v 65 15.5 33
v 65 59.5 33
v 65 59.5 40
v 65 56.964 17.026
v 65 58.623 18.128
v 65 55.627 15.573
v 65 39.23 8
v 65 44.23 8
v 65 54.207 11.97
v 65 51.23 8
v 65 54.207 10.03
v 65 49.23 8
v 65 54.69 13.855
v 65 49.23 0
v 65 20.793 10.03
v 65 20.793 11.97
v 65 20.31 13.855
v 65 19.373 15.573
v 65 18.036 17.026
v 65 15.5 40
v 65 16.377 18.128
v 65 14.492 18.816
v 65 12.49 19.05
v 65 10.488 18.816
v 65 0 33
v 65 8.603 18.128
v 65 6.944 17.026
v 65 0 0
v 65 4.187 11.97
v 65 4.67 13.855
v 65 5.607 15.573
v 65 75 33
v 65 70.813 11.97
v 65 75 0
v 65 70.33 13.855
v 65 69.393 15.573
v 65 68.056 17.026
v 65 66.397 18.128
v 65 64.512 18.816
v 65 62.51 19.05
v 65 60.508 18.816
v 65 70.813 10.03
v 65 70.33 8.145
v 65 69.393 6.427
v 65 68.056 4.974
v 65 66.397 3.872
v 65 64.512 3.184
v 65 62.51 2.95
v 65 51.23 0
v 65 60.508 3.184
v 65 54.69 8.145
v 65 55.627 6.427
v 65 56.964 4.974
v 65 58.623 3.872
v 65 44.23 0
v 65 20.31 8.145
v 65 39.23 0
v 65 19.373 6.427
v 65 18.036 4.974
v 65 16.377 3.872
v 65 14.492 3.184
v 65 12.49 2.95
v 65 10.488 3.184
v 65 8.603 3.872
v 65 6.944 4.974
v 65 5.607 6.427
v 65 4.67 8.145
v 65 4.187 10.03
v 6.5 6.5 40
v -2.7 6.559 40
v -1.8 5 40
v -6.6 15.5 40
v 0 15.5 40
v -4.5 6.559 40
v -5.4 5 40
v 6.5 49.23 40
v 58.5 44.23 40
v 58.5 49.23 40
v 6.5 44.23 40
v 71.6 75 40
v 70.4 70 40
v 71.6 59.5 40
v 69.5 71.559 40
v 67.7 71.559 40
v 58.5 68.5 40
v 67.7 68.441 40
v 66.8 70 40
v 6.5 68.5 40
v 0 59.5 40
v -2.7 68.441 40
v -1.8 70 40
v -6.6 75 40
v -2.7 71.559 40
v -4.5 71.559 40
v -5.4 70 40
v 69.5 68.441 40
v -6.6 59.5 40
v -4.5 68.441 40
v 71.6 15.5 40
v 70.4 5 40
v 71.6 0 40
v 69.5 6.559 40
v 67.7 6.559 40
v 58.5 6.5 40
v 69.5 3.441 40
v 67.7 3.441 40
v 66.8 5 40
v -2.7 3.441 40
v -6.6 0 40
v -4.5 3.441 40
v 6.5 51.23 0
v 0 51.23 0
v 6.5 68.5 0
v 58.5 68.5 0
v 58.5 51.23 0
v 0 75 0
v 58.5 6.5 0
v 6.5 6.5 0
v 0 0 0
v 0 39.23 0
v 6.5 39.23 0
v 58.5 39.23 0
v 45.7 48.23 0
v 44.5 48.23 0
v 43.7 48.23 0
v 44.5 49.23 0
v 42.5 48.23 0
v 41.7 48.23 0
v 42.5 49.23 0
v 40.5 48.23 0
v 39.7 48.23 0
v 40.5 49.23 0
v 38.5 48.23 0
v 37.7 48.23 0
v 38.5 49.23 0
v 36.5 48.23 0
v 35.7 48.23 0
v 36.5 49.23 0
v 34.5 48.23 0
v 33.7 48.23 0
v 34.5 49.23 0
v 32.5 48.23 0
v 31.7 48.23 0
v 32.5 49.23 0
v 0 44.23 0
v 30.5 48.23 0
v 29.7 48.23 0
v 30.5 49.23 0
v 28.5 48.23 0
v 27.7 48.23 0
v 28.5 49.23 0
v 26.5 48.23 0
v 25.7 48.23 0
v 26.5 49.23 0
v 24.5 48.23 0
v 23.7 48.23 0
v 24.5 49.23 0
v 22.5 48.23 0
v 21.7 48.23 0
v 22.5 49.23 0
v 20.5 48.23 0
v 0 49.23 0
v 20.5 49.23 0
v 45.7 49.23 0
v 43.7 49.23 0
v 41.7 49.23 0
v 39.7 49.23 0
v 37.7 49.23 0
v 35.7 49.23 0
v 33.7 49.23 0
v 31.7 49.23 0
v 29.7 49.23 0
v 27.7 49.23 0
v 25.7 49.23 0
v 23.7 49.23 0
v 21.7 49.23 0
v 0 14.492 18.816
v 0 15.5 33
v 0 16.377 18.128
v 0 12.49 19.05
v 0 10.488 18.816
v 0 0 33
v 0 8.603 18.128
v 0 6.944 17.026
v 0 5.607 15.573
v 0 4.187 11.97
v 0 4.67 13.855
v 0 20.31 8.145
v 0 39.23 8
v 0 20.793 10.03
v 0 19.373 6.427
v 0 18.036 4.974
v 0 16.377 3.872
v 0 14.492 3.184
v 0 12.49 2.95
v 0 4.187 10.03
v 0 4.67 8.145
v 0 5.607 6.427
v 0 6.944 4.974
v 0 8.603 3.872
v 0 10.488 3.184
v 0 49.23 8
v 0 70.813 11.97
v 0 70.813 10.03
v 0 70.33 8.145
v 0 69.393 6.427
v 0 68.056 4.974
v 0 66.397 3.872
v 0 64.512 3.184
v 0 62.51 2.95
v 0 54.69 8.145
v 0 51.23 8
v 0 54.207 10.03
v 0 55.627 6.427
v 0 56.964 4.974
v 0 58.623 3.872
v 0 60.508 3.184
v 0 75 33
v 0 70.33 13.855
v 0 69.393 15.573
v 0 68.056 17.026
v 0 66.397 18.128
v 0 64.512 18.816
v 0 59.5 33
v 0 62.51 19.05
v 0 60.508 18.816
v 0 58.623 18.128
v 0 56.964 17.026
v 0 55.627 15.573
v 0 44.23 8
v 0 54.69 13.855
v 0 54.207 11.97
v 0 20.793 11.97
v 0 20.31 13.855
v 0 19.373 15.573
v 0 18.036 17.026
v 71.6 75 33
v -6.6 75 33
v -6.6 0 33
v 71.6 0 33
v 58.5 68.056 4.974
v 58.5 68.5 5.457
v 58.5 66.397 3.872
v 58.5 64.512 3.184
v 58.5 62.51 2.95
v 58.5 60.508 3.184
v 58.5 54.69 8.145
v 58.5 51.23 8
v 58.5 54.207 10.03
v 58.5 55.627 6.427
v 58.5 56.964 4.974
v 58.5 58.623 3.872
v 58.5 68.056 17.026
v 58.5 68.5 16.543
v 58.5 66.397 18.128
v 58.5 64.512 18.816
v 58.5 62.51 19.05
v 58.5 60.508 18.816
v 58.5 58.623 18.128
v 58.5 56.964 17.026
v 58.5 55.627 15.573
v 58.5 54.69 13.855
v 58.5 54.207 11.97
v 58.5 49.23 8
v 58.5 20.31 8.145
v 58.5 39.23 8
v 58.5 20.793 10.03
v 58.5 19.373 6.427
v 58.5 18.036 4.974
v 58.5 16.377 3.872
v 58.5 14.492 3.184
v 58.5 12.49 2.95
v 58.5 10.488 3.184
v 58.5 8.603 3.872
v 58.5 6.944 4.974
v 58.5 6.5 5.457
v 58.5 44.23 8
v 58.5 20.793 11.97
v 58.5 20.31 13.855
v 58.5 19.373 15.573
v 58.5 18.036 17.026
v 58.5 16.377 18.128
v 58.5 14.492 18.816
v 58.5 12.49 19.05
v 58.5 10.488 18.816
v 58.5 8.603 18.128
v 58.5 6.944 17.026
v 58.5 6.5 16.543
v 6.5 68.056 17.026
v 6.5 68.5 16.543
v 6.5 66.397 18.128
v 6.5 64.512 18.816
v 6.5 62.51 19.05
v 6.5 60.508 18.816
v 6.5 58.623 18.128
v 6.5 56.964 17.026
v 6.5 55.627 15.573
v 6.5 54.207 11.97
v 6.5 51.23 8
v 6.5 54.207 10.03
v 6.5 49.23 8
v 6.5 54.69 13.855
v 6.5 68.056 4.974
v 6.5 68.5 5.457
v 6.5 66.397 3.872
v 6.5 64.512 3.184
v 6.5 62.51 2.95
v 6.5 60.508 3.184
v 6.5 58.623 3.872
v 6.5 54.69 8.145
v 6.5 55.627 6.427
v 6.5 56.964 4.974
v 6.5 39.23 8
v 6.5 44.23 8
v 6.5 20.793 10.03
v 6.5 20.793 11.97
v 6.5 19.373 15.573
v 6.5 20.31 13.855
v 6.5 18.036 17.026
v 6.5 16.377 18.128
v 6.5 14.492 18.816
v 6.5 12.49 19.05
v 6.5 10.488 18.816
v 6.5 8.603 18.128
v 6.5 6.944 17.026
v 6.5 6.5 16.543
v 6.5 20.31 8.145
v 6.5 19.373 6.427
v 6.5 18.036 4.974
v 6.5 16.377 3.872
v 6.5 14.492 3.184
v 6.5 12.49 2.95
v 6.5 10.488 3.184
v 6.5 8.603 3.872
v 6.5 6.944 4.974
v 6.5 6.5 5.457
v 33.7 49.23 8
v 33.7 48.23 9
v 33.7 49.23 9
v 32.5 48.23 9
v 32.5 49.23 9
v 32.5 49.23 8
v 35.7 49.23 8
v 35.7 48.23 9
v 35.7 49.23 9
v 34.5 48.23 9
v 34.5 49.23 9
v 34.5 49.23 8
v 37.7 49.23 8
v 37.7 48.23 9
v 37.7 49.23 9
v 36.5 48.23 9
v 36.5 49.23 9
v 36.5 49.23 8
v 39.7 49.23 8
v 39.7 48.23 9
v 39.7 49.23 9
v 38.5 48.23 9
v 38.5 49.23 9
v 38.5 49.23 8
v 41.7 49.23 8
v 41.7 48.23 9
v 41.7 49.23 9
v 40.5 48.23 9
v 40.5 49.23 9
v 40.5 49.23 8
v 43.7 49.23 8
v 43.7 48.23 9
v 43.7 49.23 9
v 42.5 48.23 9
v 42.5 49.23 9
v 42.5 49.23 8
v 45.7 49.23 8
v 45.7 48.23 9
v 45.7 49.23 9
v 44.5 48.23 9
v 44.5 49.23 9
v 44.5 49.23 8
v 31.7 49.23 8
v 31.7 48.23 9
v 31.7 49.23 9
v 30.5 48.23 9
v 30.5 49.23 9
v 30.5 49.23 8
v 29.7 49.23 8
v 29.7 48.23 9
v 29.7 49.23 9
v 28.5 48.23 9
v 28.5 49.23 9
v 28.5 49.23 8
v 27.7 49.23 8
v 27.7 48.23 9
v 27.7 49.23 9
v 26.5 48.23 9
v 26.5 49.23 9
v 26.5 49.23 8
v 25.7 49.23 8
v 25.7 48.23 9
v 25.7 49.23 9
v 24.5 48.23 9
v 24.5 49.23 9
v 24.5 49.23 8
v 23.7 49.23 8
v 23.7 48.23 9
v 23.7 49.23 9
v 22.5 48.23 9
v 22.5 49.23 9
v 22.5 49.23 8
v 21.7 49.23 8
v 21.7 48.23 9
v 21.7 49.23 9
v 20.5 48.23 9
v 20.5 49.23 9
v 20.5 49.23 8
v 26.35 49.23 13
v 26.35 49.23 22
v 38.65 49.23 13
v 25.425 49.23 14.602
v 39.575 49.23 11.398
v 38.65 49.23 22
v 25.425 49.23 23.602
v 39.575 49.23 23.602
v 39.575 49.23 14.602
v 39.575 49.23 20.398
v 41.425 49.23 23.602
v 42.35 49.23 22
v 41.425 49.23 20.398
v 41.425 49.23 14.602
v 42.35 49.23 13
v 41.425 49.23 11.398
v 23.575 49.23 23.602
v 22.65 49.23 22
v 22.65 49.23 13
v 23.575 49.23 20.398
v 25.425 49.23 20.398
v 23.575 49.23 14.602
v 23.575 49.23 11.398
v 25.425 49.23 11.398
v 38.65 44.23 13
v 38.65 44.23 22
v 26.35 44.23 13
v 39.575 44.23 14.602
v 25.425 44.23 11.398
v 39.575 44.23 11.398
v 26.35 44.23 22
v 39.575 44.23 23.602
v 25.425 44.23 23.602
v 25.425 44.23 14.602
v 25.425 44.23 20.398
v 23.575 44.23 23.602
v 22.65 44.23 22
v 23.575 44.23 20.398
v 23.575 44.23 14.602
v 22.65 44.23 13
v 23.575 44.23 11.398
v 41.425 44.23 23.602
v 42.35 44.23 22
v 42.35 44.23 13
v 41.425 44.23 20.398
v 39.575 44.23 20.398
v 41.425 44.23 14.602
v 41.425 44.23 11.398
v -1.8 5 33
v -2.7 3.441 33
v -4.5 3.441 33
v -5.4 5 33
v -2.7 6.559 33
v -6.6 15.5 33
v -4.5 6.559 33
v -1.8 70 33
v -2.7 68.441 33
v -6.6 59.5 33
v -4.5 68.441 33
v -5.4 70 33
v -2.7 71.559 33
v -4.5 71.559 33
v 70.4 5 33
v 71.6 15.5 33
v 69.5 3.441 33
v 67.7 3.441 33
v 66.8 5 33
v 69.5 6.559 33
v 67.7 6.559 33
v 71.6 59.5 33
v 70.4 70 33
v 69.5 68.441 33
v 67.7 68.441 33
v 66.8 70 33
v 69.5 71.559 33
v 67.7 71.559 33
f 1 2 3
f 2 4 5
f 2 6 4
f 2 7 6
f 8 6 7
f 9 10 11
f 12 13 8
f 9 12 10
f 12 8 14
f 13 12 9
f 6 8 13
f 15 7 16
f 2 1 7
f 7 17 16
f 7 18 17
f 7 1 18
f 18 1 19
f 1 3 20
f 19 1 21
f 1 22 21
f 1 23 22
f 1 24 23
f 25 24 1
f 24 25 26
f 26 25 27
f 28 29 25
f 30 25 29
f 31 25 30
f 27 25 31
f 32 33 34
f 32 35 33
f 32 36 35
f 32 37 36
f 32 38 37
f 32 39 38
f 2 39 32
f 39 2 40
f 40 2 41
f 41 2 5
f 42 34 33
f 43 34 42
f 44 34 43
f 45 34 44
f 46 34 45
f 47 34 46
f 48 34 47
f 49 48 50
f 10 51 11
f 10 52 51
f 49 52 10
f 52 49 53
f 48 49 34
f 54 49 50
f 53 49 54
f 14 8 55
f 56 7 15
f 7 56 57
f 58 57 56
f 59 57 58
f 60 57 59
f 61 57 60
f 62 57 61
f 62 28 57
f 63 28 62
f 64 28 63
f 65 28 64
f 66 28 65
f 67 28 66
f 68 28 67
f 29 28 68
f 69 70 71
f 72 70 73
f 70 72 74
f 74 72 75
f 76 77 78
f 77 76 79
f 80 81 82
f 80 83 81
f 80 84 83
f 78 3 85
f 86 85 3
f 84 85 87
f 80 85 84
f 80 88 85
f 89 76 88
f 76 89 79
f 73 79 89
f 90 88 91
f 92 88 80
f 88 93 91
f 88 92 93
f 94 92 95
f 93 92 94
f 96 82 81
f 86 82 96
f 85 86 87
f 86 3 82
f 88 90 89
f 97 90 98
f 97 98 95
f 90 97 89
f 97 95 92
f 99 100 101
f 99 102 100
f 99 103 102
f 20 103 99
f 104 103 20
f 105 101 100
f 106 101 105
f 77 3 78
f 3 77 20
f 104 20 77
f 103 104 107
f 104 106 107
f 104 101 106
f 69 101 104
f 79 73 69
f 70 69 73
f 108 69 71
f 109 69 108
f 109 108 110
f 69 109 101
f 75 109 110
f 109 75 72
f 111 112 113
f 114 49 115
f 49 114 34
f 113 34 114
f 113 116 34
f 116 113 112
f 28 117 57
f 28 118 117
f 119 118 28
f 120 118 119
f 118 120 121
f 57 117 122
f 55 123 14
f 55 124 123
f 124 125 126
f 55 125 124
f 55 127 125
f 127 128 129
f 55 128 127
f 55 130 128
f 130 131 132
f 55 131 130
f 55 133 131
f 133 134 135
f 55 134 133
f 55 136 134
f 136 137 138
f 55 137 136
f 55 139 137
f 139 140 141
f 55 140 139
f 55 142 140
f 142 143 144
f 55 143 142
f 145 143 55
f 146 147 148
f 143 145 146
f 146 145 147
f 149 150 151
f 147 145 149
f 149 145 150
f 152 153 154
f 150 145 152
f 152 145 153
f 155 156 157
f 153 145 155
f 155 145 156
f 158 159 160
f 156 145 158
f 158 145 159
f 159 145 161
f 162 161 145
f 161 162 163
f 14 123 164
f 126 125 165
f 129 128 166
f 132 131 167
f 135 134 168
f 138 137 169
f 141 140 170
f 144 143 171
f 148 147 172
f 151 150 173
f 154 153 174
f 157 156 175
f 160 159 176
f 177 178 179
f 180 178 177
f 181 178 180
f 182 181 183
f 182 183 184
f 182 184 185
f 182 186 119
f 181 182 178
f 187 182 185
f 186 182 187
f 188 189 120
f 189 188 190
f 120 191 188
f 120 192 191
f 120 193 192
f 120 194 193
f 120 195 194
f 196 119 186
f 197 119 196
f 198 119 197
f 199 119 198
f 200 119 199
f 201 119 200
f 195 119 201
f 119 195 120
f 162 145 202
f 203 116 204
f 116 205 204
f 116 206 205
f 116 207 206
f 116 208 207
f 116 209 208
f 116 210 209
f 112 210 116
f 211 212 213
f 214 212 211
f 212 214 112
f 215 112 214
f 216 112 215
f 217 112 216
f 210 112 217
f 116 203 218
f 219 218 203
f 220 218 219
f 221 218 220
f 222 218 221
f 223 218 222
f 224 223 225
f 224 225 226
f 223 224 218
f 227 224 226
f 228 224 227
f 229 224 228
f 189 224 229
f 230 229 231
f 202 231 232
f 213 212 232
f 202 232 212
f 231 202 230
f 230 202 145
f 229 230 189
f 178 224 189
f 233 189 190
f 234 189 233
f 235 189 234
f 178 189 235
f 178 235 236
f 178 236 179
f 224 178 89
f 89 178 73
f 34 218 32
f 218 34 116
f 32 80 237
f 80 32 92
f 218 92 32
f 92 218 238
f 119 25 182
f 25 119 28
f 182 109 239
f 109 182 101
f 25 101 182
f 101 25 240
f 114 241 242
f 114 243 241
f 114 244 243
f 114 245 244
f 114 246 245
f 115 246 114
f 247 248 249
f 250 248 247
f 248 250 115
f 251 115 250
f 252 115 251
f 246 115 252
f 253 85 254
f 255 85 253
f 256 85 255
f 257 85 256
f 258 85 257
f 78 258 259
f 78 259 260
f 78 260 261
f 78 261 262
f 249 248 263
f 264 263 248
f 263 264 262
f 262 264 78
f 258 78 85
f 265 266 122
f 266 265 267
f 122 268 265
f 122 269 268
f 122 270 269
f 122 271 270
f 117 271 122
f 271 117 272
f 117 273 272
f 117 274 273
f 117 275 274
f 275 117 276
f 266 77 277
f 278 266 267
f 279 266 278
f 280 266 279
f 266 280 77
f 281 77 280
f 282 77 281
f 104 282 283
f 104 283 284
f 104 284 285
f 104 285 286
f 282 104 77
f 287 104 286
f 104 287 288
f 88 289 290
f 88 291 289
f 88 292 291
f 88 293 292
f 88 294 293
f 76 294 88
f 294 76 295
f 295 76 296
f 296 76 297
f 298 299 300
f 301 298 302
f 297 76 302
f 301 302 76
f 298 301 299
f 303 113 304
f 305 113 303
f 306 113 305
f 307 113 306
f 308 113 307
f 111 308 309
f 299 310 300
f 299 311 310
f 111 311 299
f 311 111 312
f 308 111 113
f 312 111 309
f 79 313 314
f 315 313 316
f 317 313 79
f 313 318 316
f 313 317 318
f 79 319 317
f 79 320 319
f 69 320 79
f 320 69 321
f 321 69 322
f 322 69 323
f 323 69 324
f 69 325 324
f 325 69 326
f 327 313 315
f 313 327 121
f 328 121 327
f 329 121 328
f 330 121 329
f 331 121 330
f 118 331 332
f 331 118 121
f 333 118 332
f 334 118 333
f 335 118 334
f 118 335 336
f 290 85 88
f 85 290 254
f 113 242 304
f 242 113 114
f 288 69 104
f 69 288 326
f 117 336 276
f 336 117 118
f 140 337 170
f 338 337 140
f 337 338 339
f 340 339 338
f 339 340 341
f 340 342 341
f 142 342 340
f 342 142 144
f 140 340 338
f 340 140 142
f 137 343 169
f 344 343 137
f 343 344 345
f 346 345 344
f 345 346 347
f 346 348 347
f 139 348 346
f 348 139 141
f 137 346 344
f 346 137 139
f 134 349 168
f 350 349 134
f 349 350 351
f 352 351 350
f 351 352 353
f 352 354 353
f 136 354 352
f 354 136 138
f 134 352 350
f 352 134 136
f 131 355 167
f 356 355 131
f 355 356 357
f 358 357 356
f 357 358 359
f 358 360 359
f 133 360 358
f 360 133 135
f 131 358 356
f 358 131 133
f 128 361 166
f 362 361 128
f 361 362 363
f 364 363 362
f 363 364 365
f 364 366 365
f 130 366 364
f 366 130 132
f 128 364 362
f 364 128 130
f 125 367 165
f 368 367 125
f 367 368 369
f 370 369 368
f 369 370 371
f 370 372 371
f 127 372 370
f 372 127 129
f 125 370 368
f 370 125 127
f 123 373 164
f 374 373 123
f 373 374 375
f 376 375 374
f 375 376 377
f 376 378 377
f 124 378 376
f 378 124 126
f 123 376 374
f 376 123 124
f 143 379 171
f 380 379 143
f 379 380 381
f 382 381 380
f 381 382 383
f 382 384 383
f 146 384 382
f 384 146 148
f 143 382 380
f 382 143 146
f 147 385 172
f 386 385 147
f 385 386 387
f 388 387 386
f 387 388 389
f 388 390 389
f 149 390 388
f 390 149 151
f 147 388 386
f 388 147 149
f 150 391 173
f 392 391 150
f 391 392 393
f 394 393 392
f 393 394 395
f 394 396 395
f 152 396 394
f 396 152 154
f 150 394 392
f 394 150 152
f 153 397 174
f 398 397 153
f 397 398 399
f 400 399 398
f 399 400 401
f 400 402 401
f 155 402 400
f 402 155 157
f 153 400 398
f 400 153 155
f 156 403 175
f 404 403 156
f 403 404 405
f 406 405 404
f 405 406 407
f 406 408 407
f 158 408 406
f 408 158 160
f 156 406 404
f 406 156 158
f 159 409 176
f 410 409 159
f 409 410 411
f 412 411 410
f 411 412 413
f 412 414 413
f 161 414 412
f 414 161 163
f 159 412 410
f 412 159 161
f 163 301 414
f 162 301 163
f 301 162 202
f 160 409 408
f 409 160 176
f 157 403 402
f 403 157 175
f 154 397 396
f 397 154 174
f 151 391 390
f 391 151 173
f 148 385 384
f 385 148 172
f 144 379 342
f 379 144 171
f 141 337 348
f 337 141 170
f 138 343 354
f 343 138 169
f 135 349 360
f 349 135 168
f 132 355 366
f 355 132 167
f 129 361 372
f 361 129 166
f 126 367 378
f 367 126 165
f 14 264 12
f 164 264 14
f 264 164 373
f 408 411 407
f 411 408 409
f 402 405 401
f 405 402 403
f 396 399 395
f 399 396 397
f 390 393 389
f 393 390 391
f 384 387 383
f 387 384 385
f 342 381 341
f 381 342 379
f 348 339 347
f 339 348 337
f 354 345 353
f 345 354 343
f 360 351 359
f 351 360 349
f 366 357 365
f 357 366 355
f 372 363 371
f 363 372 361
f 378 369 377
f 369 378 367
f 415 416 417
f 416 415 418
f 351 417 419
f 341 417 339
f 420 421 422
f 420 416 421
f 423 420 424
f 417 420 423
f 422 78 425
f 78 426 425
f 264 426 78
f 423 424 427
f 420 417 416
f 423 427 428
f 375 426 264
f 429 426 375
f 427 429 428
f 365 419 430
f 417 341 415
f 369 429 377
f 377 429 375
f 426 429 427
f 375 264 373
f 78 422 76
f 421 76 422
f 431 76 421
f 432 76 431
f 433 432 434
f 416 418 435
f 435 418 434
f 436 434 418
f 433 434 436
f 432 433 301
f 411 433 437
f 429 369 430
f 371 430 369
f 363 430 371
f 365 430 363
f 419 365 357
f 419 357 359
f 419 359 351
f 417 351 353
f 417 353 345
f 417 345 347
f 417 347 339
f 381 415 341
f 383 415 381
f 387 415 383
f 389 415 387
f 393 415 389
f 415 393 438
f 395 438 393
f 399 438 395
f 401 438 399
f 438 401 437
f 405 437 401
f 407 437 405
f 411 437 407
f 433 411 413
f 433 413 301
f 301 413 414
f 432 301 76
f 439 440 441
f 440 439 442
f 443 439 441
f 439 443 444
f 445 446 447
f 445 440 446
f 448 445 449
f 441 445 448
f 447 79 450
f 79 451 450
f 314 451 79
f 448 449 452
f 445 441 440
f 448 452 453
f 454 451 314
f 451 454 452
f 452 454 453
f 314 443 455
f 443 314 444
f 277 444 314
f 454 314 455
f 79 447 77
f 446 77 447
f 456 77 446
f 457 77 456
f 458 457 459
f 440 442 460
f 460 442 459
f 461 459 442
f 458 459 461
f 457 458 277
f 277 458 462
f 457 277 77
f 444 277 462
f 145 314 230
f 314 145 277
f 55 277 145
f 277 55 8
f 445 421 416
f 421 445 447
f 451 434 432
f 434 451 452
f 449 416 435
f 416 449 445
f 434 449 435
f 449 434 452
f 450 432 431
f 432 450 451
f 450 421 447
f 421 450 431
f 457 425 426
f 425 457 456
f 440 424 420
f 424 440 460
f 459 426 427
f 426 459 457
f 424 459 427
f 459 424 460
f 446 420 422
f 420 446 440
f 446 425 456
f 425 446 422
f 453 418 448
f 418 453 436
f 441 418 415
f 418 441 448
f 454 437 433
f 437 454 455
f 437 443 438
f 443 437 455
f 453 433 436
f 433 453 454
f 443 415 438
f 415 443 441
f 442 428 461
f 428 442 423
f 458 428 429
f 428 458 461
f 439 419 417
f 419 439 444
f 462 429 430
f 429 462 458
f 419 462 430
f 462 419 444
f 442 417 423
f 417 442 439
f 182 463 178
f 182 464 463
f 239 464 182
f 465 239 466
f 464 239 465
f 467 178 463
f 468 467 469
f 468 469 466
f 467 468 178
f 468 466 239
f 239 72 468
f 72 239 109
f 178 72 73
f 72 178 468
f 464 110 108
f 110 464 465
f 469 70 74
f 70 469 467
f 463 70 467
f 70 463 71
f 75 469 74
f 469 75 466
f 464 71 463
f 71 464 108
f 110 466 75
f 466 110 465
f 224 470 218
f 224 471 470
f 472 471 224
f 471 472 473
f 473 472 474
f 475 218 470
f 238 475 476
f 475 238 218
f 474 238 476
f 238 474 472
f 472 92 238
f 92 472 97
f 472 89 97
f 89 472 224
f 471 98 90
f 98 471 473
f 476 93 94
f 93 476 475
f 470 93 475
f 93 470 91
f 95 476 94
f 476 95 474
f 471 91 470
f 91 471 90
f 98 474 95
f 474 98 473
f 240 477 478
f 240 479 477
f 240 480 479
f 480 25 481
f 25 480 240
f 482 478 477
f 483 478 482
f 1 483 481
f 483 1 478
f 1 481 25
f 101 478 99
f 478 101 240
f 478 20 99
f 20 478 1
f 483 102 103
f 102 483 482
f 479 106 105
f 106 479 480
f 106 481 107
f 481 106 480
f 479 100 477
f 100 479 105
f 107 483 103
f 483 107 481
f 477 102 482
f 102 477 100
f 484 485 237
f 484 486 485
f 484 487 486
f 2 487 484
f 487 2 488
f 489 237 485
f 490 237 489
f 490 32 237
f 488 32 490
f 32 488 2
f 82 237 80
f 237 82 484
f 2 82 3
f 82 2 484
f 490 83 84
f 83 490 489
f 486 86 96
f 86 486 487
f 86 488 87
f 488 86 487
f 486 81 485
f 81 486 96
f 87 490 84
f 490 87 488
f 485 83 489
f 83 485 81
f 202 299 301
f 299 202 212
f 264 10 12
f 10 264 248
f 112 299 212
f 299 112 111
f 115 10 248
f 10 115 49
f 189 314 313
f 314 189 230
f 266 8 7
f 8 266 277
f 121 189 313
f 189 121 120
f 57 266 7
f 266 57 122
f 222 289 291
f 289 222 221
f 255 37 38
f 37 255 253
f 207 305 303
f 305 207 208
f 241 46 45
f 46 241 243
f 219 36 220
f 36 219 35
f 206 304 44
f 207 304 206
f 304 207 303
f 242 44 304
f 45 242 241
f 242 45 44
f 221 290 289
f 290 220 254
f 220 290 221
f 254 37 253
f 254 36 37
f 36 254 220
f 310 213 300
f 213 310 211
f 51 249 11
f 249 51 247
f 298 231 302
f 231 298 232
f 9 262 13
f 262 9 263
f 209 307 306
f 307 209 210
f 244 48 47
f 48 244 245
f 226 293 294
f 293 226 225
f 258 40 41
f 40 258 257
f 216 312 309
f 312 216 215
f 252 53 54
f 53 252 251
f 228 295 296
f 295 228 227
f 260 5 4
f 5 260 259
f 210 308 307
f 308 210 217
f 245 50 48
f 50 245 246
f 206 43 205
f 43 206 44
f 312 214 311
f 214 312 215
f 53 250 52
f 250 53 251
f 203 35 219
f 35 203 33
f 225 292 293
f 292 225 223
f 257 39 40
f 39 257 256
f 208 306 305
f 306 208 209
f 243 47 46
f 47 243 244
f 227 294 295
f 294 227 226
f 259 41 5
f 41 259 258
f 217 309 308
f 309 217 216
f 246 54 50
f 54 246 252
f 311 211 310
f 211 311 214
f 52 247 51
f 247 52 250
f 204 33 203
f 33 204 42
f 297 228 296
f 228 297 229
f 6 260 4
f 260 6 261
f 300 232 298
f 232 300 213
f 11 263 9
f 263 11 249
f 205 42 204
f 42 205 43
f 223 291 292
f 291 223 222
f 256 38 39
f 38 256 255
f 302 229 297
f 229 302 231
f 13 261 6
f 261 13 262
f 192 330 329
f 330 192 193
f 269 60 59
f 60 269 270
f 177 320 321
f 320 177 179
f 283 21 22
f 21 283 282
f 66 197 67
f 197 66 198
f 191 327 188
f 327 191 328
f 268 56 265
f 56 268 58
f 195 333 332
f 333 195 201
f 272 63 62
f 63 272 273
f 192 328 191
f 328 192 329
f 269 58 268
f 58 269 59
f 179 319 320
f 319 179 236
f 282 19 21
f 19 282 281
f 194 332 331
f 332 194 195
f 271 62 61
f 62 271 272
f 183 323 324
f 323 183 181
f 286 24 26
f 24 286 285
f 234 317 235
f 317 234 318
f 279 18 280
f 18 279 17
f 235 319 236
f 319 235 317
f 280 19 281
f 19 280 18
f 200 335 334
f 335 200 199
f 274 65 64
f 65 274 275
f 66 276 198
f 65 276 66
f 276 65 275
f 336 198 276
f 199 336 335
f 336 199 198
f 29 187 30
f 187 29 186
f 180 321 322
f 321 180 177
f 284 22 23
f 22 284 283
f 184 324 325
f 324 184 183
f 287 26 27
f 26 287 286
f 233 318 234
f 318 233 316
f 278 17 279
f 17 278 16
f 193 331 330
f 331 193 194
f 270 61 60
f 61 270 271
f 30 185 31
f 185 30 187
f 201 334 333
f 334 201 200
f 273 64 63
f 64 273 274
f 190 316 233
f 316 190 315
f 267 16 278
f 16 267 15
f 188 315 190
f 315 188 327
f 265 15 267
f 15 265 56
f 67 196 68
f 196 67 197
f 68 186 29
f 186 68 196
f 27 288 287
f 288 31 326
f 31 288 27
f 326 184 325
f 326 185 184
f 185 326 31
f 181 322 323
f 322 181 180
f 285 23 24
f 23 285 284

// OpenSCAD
box_width = 65;
box_length = 75;
box_height = 40;

frame_thickness = 13;

bar_radius = 15.5/2+.3;
bar_separation = 49.27+.75;

belt_mount_length = 5;
belt_mount_offset = 13.28;


platform_mount_height = 7;

module frame() {
  union() {
    // outer box
    difference() {
      cube(size=[box_width,box_length,box_height]);

      translate([frame_thickness/2,frame_thickness/2,-.25])
        cube(size=[box_width-frame_thickness,box_length-frame_thickness,box_height+.5]);
    }

    // belt mount
    translate([0,box_length/2+bar_separation/2,0])
      translate([0, -belt_mount_offset-belt_mount_length/2,0])
        translate([0, -belt_mount_length/2, 0]) {
          difference() {
            cube(size=[box_width, belt_mount_length, box_height]);

            // teeth
            union() {
              translate([box_width/2,4,0]) {
                cube(size=[1.2,10,9]);

                translate([2,0,0])
                  cube(size=[1.2,10,9]);
                translate([4,0,0])
                  cube(size=[1.2,10,9]);
                translate([6,0,0])
                  cube(size=[1.2,1+10,9]);
                translate([8,0,0])
                  cube(size=[1.2,10,9]);
                translate([10,0,0])
                  cube(size=[1.2,10,9]);
                translate([12,0,0])
                  cube(size=[1.2,10,9]);

                translate([-2,0,0])
                  cube(size=[1.2,10,9]);
                translate([-4,0,0])
                  cube(size=[1.2,10,9]);
                translate([-6,0,0])
                  cube(size=[1.2,10,9]);
                translate([-8,0,0])
                  cube(size=[1.2,10,9]);
                translate([-10,0,0])
                  cube(size=[1.2,10,9]);
                translate([-12,0,0])
                  cube(size=[1.2,10,9]);
              }
            }

            // bolt holes
            translate([box_width/2-8,belt_mount_length+.25,22])
              rotate(a=[90,0,0])
                cylinder(h=belt_mount_length+.5,r=1.85);
            translate([box_width/2+8,belt_mount_length+.25,22])
              rotate(a=[90,0,0])
                cylinder(h=belt_mount_length+.5,r=1.85);
            translate([box_width/2-8,belt_mount_length+.25,13])
              rotate(a=[90,0,0])
                cylinder(h=belt_mount_length+.5,r=1.85);
            translate([box_width/2+8,belt_mount_length+.25,13])
              rotate(a=[90,0,0])
                cylinder(h=belt_mount_length+.5,r=1.85);
          }

        }
   
    // top nut mounts
    translate([-frame_thickness/2-.1,0,box_height-platform_mount_height])
      difference() {
        cube(size=[frame_thickness,frame_thickness+2.5,platform_mount_height]);
        translate([3, 5, -.25])
          cylinder(h=platform_mount_height +0.5,r=1.8);
      }

    translate([-frame_thickness/2-.1,box_length-frame_thickness-2.5,box_height-platform_mount_height])
      difference() {
        cube(size=[frame_thickness,frame_thickness+2.5,platform_mount_height]);
        translate([3, frame_thickness+2.5-5, -.25])
          cylinder(h=platform_mount_height +0.5,r=1.8);
      }

    translate([box_width+frame_thickness/2+.1,frame_thickness+2.5,box_height-platform_mount_height])
      rotate(a=[0,0,180])
        difference() {
          cube(size=[frame_thickness,frame_thickness+2.5,platform_mount_height]);
          translate([3, frame_thickness+2.5-5, -.25])
            cylinder(h=platform_mount_height +0.5,r=1.8);
        }

    translate([box_width+frame_thickness/2+.1,box_length,box_height-platform_mount_height])
      rotate(a=[0,0,180])
        difference() {
          cube(size=[frame_thickness,frame_thickness+2.5,platform_mount_height]);
          translate([3, 5, -.25])
            cylinder(h=platform_mount_height +0.5,r=1.8);
        }
  }
}

difference() {
  frame();
  
  // axle punchouts
  translate([-.25,box_length/2+bar_separation/2,11])
    rotate(a=[0,90,0])
      scale([1,16/15.4,1])
        cylinder(h=box_width+.5, r=bar_radius);
  translate([-.25,box_length/2-bar_separation/2,11])
    rotate(a=[0,90,0])
      scale([1,16/15.4,1])
        cylinder(h=box_width+.5, r=bar_radius);

  // belt punchouts
  translate([-.25,box_length/2+bar_separation/2,0]) {
    translate([0,-belt_mount_offset-belt_mount_length/2,0]) {
      translate([0, belt_mount_length/2, 0])
        cube(size=[box_width+.5, 2, 8]);
      translate([0, -2*belt_mount_length/2-belt_mount_length/2, 0])
        cube(size=[box_width+.5, belt_mount_length, 8]);
    }
  }
}
